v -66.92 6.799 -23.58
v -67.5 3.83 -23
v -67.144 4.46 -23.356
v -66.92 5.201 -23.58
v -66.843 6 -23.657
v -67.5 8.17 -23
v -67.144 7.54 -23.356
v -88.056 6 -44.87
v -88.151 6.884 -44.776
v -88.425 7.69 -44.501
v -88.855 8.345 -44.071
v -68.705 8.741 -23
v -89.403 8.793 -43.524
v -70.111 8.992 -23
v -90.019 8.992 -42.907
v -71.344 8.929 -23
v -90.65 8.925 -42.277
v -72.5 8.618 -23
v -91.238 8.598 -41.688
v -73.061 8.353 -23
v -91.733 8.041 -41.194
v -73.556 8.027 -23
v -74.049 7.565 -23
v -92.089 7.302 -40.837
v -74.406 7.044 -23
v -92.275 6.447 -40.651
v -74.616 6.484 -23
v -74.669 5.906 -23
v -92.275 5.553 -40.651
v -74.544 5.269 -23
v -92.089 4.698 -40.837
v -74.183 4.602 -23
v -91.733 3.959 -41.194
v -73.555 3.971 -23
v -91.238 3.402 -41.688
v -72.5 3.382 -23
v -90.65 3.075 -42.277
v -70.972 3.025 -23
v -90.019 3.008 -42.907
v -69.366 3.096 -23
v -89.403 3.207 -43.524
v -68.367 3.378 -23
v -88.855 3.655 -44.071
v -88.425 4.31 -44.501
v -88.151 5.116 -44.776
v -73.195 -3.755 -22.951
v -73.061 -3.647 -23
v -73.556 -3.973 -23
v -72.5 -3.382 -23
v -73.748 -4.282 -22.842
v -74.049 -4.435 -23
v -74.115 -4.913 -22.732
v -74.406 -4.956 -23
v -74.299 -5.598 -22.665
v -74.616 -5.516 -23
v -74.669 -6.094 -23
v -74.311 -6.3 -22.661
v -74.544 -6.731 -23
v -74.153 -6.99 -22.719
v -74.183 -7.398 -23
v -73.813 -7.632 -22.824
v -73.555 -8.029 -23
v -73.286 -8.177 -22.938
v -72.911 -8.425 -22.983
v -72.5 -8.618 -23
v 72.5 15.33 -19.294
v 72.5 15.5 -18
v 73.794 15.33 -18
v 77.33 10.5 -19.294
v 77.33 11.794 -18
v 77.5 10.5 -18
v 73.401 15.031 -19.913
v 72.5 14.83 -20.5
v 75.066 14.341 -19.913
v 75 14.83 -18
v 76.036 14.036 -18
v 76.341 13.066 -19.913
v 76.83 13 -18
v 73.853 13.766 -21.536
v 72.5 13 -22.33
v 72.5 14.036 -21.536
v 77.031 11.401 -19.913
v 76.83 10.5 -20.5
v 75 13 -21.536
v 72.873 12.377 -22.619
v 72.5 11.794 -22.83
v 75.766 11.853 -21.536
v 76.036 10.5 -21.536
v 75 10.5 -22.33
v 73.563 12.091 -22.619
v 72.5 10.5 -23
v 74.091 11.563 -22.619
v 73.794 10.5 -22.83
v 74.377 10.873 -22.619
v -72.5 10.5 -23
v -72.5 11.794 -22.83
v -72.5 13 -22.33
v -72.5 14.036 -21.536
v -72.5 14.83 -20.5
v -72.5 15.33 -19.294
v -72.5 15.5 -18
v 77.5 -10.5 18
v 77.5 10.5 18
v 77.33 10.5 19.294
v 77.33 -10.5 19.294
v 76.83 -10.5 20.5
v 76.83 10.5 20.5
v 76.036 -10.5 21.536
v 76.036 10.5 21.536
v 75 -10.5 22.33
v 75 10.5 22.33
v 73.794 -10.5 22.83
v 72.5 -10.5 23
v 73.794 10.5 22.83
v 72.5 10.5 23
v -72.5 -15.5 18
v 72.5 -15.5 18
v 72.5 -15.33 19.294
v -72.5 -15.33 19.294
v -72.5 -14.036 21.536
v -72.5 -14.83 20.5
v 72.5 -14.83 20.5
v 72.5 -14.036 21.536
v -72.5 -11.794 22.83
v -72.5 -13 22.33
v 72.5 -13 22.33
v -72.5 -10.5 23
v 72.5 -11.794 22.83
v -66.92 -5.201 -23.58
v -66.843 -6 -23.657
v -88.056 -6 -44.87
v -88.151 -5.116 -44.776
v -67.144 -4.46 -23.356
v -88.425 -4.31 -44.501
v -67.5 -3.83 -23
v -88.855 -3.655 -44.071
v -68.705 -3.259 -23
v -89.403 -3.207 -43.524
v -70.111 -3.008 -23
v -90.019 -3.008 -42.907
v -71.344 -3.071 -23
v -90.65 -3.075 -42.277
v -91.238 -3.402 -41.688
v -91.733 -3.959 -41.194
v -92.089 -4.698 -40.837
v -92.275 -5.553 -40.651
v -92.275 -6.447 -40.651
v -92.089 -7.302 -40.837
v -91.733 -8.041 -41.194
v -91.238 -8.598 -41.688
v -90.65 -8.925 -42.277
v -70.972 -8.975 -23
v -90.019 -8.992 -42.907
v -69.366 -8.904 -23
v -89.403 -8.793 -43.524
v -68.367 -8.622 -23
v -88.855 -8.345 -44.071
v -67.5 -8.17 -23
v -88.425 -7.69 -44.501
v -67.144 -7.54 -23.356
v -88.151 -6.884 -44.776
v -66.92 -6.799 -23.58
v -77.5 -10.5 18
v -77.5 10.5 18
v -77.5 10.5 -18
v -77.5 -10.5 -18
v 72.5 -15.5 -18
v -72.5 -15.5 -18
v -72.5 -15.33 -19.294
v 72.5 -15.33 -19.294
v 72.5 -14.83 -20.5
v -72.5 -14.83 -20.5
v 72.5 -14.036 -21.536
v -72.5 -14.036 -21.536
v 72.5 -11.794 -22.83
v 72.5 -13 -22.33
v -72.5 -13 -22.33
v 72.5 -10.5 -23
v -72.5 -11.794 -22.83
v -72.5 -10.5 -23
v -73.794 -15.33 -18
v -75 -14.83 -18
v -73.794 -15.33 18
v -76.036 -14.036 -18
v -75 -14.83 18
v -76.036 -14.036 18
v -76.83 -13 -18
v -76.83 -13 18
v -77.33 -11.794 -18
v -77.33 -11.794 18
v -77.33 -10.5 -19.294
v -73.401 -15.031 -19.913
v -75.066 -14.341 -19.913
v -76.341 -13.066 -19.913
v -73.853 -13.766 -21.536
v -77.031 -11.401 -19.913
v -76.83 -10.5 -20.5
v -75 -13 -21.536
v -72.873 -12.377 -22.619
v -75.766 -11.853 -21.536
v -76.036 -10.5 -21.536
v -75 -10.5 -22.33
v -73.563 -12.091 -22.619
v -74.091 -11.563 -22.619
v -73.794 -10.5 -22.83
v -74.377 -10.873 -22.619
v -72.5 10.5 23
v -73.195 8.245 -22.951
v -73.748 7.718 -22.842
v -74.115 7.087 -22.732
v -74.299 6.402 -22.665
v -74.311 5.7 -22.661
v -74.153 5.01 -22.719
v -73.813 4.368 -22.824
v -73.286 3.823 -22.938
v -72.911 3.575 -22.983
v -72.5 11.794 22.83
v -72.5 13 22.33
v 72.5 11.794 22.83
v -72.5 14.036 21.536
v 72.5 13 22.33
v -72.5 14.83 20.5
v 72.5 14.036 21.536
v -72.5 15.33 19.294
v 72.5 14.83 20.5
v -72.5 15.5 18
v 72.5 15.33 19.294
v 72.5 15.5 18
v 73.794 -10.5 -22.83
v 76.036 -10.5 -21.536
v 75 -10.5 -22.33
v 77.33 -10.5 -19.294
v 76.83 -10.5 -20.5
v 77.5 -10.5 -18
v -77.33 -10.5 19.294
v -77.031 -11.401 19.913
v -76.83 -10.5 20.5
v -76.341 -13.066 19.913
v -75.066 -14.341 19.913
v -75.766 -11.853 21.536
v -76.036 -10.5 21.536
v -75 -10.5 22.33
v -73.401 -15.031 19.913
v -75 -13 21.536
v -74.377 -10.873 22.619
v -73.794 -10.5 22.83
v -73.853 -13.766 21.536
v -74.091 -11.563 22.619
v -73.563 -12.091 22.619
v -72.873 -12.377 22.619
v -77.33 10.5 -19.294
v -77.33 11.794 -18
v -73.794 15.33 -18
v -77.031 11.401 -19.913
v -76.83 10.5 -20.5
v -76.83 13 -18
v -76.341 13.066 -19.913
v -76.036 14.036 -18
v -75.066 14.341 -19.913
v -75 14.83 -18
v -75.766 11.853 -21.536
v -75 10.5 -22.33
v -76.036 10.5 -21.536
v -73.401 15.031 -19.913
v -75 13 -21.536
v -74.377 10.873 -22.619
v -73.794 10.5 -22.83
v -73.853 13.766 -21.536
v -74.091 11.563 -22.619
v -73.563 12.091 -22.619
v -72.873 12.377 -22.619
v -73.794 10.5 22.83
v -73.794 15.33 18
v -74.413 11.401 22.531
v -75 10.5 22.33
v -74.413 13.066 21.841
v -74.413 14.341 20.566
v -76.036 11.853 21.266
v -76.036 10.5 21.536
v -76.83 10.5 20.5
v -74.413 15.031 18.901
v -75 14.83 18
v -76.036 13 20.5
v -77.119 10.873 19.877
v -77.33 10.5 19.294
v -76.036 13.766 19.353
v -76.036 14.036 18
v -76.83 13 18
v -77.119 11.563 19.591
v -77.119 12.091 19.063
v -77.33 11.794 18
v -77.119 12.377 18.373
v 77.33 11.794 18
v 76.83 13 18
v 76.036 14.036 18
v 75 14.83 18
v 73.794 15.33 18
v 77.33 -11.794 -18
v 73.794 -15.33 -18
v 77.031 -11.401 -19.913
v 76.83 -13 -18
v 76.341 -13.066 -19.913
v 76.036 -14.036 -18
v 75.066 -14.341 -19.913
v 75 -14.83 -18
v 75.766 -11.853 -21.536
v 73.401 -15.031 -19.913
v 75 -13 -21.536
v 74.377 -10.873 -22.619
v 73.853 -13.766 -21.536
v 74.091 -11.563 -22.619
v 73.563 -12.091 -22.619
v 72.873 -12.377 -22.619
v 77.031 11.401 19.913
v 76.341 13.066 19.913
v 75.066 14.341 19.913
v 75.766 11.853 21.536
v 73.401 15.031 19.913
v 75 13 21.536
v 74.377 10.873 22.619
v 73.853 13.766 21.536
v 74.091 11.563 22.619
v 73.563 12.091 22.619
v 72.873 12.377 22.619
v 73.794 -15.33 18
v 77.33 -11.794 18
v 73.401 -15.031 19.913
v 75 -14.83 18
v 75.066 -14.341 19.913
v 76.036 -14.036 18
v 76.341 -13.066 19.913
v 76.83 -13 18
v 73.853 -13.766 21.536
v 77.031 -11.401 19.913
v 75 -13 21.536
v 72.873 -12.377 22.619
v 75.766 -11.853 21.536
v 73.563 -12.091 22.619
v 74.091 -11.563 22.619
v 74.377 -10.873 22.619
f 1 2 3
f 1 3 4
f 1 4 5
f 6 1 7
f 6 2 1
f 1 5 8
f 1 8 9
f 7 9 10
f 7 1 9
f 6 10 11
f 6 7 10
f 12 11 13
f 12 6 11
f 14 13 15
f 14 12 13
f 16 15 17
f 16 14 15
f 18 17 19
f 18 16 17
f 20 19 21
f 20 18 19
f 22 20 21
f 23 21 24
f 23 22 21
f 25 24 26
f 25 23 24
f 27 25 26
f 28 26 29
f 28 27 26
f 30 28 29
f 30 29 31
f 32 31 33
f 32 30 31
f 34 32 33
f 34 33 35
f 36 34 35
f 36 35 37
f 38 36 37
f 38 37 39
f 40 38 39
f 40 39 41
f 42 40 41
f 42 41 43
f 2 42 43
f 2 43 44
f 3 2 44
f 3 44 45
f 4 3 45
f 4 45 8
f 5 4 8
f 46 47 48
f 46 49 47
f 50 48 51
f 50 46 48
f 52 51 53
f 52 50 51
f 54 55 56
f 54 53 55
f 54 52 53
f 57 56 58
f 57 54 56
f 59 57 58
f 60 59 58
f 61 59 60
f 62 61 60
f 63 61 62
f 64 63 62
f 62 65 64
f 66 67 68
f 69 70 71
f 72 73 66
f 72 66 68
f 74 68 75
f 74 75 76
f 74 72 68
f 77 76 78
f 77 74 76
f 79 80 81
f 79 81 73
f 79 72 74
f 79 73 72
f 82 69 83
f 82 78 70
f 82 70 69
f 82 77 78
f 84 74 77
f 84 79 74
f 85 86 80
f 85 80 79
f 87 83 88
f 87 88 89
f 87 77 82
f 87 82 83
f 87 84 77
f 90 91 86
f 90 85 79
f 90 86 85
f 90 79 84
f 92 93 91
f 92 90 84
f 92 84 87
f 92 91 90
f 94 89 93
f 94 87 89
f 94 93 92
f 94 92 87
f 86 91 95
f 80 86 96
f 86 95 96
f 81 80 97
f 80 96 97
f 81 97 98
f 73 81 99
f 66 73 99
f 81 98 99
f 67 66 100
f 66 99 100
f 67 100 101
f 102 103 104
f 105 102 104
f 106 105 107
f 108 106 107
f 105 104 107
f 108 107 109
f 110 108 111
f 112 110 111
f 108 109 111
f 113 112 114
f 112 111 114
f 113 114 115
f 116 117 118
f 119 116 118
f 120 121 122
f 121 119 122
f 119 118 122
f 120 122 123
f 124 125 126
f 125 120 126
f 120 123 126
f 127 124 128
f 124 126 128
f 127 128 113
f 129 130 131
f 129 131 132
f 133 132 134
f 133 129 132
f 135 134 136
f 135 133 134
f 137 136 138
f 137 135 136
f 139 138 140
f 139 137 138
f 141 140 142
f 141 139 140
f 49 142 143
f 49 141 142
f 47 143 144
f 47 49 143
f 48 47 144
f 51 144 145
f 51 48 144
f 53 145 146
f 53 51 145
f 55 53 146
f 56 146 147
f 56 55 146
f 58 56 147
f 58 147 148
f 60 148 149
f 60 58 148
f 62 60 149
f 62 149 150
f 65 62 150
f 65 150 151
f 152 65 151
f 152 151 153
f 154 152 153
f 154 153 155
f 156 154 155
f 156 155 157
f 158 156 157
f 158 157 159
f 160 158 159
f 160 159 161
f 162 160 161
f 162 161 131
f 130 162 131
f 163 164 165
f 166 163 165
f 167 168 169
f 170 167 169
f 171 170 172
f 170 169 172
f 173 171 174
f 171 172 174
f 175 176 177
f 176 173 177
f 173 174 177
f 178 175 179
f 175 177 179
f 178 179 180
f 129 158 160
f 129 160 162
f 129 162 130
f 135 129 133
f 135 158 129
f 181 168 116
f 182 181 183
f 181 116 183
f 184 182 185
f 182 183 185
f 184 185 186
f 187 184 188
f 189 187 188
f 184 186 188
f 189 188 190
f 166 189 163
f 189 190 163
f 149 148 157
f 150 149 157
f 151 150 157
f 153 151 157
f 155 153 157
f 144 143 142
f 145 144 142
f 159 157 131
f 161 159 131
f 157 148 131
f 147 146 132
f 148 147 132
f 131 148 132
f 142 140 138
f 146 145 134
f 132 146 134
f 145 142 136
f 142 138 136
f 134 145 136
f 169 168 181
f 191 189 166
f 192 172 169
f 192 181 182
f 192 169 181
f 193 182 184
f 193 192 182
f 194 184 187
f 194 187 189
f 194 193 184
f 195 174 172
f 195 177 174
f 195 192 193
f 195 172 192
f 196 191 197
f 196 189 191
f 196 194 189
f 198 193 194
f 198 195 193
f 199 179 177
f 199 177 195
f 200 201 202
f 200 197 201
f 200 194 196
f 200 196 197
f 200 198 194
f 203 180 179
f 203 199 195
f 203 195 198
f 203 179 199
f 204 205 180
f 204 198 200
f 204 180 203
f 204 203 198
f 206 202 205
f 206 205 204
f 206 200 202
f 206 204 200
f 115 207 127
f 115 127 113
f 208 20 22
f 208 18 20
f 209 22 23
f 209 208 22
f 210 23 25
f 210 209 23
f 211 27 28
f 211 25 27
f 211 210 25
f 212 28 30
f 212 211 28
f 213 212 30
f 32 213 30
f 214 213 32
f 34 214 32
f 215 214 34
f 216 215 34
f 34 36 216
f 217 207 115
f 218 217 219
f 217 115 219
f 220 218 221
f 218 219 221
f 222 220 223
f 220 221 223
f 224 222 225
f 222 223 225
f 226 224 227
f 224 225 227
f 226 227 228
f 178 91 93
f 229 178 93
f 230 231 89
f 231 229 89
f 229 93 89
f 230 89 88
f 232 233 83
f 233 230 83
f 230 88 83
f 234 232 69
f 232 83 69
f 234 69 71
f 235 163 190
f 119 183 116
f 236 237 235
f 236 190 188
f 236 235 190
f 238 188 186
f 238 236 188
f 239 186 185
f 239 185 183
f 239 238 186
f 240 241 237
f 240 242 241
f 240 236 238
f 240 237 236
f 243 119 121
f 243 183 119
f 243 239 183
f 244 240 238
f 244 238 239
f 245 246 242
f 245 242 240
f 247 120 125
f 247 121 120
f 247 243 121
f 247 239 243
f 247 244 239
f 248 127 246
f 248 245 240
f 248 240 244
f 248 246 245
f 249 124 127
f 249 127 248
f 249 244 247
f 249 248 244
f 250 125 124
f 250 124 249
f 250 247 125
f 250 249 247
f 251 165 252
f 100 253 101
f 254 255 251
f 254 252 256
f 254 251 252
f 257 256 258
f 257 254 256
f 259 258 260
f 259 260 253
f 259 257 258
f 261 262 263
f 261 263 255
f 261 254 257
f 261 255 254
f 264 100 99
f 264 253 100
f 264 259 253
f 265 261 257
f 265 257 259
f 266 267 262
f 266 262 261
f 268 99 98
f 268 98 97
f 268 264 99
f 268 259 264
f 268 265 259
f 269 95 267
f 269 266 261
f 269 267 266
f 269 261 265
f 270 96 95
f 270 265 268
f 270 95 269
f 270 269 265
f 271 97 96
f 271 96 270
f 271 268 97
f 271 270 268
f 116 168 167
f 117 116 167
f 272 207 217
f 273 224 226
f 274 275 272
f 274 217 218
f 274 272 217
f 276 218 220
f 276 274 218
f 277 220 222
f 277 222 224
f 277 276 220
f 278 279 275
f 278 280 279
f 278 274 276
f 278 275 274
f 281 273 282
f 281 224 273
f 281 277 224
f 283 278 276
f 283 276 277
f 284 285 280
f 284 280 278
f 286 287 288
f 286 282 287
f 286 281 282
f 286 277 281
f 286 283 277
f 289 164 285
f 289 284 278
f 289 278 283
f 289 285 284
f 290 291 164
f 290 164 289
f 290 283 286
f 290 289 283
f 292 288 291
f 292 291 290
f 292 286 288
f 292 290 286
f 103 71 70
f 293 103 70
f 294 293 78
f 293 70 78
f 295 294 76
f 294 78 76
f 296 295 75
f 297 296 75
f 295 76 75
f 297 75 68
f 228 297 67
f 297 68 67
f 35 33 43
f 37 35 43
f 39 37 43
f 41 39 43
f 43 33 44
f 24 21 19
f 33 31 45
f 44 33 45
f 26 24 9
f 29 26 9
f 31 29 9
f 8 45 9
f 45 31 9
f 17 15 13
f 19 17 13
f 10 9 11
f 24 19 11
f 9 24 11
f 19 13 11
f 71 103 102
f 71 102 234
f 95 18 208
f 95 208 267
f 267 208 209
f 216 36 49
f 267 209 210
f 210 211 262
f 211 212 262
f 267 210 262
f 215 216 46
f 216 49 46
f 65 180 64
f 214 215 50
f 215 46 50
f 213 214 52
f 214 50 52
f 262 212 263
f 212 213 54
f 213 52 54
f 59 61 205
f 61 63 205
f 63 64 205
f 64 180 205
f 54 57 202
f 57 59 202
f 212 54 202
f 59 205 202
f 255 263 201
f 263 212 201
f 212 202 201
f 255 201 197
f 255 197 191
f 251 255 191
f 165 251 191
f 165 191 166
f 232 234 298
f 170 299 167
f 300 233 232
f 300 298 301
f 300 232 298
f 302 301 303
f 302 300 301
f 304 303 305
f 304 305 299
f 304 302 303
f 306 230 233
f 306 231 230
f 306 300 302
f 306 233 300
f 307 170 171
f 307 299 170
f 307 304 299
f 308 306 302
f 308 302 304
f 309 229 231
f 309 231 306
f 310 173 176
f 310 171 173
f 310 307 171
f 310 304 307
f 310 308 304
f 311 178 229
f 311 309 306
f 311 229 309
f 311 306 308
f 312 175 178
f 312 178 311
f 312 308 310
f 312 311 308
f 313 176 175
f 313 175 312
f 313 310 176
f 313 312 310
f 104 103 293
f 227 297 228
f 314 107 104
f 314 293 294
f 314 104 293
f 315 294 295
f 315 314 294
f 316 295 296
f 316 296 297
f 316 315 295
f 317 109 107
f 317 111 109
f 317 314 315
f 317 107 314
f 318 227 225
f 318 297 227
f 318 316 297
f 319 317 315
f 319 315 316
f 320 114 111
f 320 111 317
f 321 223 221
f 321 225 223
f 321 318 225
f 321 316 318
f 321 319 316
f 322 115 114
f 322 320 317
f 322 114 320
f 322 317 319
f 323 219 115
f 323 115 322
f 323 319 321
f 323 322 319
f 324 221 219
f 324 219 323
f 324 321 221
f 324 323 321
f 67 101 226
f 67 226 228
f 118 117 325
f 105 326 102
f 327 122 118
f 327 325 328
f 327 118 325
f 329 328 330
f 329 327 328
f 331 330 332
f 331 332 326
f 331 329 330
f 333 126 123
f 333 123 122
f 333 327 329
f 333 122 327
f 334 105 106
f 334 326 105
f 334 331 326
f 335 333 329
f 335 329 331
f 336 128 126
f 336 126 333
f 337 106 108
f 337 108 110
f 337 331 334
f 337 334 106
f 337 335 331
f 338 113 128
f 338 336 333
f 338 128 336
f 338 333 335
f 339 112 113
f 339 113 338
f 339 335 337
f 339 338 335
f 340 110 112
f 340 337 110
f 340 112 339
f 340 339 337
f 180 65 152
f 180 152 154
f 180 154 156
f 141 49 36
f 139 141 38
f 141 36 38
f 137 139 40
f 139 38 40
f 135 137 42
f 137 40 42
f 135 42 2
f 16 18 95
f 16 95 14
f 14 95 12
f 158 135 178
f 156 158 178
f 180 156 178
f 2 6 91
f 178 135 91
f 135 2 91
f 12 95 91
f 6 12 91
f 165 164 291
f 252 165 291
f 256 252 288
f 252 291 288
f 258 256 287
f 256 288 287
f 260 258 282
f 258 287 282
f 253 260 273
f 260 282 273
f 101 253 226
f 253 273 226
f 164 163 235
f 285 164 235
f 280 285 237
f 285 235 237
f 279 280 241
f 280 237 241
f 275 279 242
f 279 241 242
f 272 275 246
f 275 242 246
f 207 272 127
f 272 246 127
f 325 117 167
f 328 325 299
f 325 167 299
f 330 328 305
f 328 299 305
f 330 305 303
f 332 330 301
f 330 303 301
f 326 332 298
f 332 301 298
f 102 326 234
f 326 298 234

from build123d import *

# Parameters (mm, degrees)
SKETCH1_W           = 155
SKETCH1_H           = 46
BOSS_EXTRUDE1_DEPTH = 15.5
SKETCH4_R           = 3
BOSS_EXTRUDE2_DEPTH = 30
FILLET1_R           = 5


with BuildPart() as part:
    # Sketch1 → Boss-Extrude1 (new, symmetric)
    with BuildSketch(Plane(origin=(0, 0, 0), x_dir=(1, 0, 0), z_dir=(0, 1, 0))):
        Rectangle(SKETCH1_W, SKETCH1_H)
    extrude(amount=BOSS_EXTRUDE1_DEPTH, both=True)

    # Sketch4 → Boss-Extrude2 (add)
    with BuildSketch(Plane(origin=(-45.25, 0, -45.25), x_dir=(0.7071067811865509, 0, -0.7071067811865442), z_dir=(0.7071067811865442, 0, 0.7071067811865509))):
        with Locations((-33.537319575, 6)):
            Circle(SKETCH4_R)
        with Locations((-33.537319575, -6)):
            Circle(SKETCH4_R)
    extrude(amount=-BOSS_EXTRUDE2_DEPTH)

    # Fillet1
    # the kernel refuses this fillet: 5 mm, written as the material it takes off along each edge
    with BuildSketch(Plane(origin=(-72.5, 10.5, 18), x_dir=(0, 1, 0), z_dir=(-1, 0, 0))) as fillet1_piece_1_section:
        Polygon((0, 0), (FILLET1_R, 0), (FILLET1_R, -FILLET1_R), (0, -FILLET1_R), align=None)
    fillet1_piece_1 = extrude(amount=FILLET1_R, mode=Mode.PRIVATE)
    fillet1_piece_1 = fillet1_piece_1 - Plane(origin=(-72.5, 10.5, 18), x_dir=(0, -0.7071067811865475, -0.7071067811865475), z_dir=(-1, 0, 0)) * Sphere(FILLET1_R, mode=Mode.PRIVATE)
    add(fillet1_piece_1, mode=Mode.SUBTRACT)
    with BuildSketch(Plane(origin=(-72.5, 10.5, -18), x_dir=(-1, 0, 0), z_dir=(0, 0, -1))) as fillet1_piece_2_section:
        Polygon((0, 0), (FILLET1_R, 0), (FILLET1_R, FILLET1_R), (0, FILLET1_R), align=None)
    fillet1_piece_2 = extrude(amount=FILLET1_R, mode=Mode.PRIVATE)
    fillet1_piece_2 = fillet1_piece_2 - Plane(origin=(-72.5, 10.5, -18), x_dir=(0.7071067811865475, -0.7071067811865475, 0), z_dir=(0, 0, -1)) * Sphere(FILLET1_R, mode=Mode.PRIVATE)
    add(fillet1_piece_2, mode=Mode.SUBTRACT)
    with BuildSketch(Plane(origin=(72.5, 10.5, 18), x_dir=(0, 1, 0), z_dir=(0, 0, 1))) as fillet1_piece_3_section:
        Polygon((0, 0), (FILLET1_R, 0), (FILLET1_R, -FILLET1_R), (0, -FILLET1_R), align=None)
    fillet1_piece_3 = extrude(amount=FILLET1_R, mode=Mode.PRIVATE)
    fillet1_piece_3 = fillet1_piece_3 - Plane(origin=(72.5, 10.5, 18), x_dir=(-0.7071067811865475, -0.7071067811865475, 0), z_dir=(0, 0, 1)) * Sphere(FILLET1_R, mode=Mode.PRIVATE)
    add(fillet1_piece_3, mode=Mode.SUBTRACT)
    with BuildSketch(Plane(origin=(72.5, 10.5, -18), x_dir=(0, 1, 0), z_dir=(0, 0, -1))) as fillet1_piece_4_section:
        Polygon((0, 0), (FILLET1_R, 0), (FILLET1_R, FILLET1_R), (0, FILLET1_R), align=None)
    fillet1_piece_4 = extrude(amount=FILLET1_R, mode=Mode.PRIVATE)
    fillet1_piece_4 = fillet1_piece_4 - Plane(origin=(72.5, 10.5, -18), x_dir=(-0.7071067811865475, -0.7071067811865475, 0), z_dir=(0, 0, -1)) * Sphere(FILLET1_R, mode=Mode.PRIVATE)
    add(fillet1_piece_4, mode=Mode.SUBTRACT)
    with BuildSketch(Plane(origin=(72.5, -10.5, 18), x_dir=(0, -1, 0), z_dir=(0, 0, 1))) as fillet1_piece_5_section:
        Polygon((0, 0), (FILLET1_R, 0), (FILLET1_R, FILLET1_R), (0, FILLET1_R), align=None)
    fillet1_piece_5 = extrude(amount=FILLET1_R, mode=Mode.PRIVATE)
    fillet1_piece_5 = fillet1_piece_5 - Plane(origin=(72.5, -10.5, 18), x_dir=(-0.7071067811865475, 0.7071067811865475, 0), z_dir=(0, 0, 1)) * Sphere(FILLET1_R, mode=Mode.PRIVATE)
    add(fillet1_piece_5, mode=Mode.SUBTRACT)
    with BuildSketch(Plane(origin=(-72.5, -10.5, 18), x_dir=(0, -1, 0), z_dir=(0, 0, 1))) as fillet1_piece_6_section:
        Polygon((0, 0), (FILLET1_R, 0), (FILLET1_R, -FILLET1_R), (0, -FILLET1_R), align=None)
    fillet1_piece_6 = extrude(amount=FILLET1_R, mode=Mode.PRIVATE)
    fillet1_piece_6 = fillet1_piece_6 - Plane(origin=(-72.5, -10.5, 18), x_dir=(0.7071067811865475, 0.7071067811865475, 0), z_dir=(0, 0, 1)) * Sphere(FILLET1_R, mode=Mode.PRIVATE)
    add(fillet1_piece_6, mode=Mode.SUBTRACT)
    with BuildSketch(Plane(origin=(-72.5, -10.5, -18), x_dir=(-1, 0, 0), z_dir=(0, 0, -1))) as fillet1_piece_7_section:
        Polygon((0, 0), (FILLET1_R, 0), (FILLET1_R, -FILLET1_R), (0, -FILLET1_R), align=None)
    fillet1_piece_7 = extrude(amount=FILLET1_R, mode=Mode.PRIVATE)
    fillet1_piece_7 = fillet1_piece_7 - Plane(origin=(-72.5, -10.5, -18), x_dir=(0.7071067811865475, 0.7071067811865475, 0), z_dir=(0, 0, -1)) * Sphere(FILLET1_R, mode=Mode.PRIVATE)
    add(fillet1_piece_7, mode=Mode.SUBTRACT)
    with BuildSketch(Plane(origin=(72.5, -10.5, -18), x_dir=(0, -1, 0), z_dir=(0, 0, -1))) as fillet1_piece_8_section:
        Polygon((0, 0), (FILLET1_R, 0), (FILLET1_R, -FILLET1_R), (0, -FILLET1_R), align=None)
    fillet1_piece_8 = extrude(amount=FILLET1_R, mode=Mode.PRIVATE)
    fillet1_piece_8 = fillet1_piece_8 - Plane(origin=(72.5, -10.5, -18), x_dir=(-0.7071067811865475, 0.7071067811865475, 0), z_dir=(0, 0, -1)) * Sphere(FILLET1_R, mode=Mode.PRIVATE)
    add(fillet1_piece_8, mode=Mode.SUBTRACT)
    with BuildSketch(Plane(origin=(-77.5, 15.5, 18), x_dir=(0, -1, 0), z_dir=(0, 0, -1)), Plane(origin=(77.5, -15.5, -18), x_dir=(-1, 0, 0), z_dir=(0, 0, 1))) as fillet1_piece_9:
        with BuildLine():
            CenterArc((FILLET1_R, -FILLET1_R), FILLET1_R, 90, 90)
            Line((0, -FILLET1_R), (0, 0))
            Line((0, 0), (FILLET1_R, 0))
        make_face()
    extrude(amount=36, mode=Mode.SUBTRACT)
    with BuildSketch(Plane(origin=(72.5, 15.5, 23), x_dir=(0, 0, -1), z_dir=(-1, 0, 0)), Plane(origin=(-72.5, -15.5, -23), x_dir=(0, 1, 0), z_dir=(1, 0, 0))) as fillet1_piece_10:
        with BuildLine():
            CenterArc((FILLET1_R, FILLET1_R), FILLET1_R, 180, 90)
            Line((0, FILLET1_R), (0, 0))
            Line((0, 0), (FILLET1_R, 0))
        make_face()
    extrude(amount=145, mode=Mode.SUBTRACT)
    with BuildSketch(Plane(origin=(77.5, 15.5, -18), x_dir=(-1, 0, 0), z_dir=(0, 0, 1)), Plane(origin=(-77.5, -15.5, 18), x_dir=(0, 1, 0), z_dir=(0, 0, -1))) as fillet1_piece_11:
        with BuildLine():
            CenterArc((FILLET1_R, FILLET1_R), FILLET1_R, 180, 90)
            Line((0, FILLET1_R), (0, 0))
            Line((0, 0), (FILLET1_R, 0))
        make_face()
    extrude(amount=36, mode=Mode.SUBTRACT)
    with BuildSketch(Plane(origin=(72.5, -15.5, 23), x_dir=(0, 0, -1), z_dir=(-1, 0, 0)), Plane(origin=(-72.5, 15.5, -23), x_dir=(0, -1, 0), z_dir=(1, 0, 0))) as fillet1_piece_12:
        with BuildLine():
            CenterArc((FILLET1_R, -FILLET1_R), FILLET1_R, 90, 90)
            Line((0, -FILLET1_R), (0, 0))
            Line((0, 0), (FILLET1_R, 0))
        make_face()
    extrude(amount=145, mode=Mode.SUBTRACT)
    with BuildSketch(Plane(origin=(77.5, 10.5, 23), x_dir=(0, 0, -1), z_dir=(0, -1, 0)), Plane(origin=(-77.5, -10.5, 23), x_dir=(0, 0, -1), z_dir=(0, 1, 0)), Plane(origin=(77.5, 10.5, -23), x_dir=(-1, 0, 0), z_dir=(0, -1, 0))) as fillet1_piece_13:
        with BuildLine():
            CenterArc((FILLET1_R, -FILLET1_R), FILLET1_R, 90, 90)
            Line((0, -FILLET1_R), (0, 0))
            Line((0, 0), (FILLET1_R, 0))
        make_face()
    extrude(amount=21, mode=Mode.SUBTRACT)
    with BuildSketch(Plane(origin=(-77.5, -10.5, -23), x_dir=(1, 0, 0), z_dir=(0, 1, 0))) as fillet1_piece_14_section:
        with BuildLine():
            CenterArc((FILLET1_R, -FILLET1_R), FILLET1_R, 90, 90)
            Line((0, -FILLET1_R), (0, 0))
            Line((0, 0), (FILLET1_R, 0))
        make_face()
    fillet1_piece_14 = extrude(amount=21, mode=Mode.PRIVATE)
    fillet1_piece_14 = fillet1_piece_14 - Plane(origin=(-72.851968895, -6, -25.423036706), x_dir=(0.7071067811865509, 0, -0.7071067811865442), z_dir=(0.7071067811865442, 0, 0.7071067811865509)) * Cylinder(3, 62, mode=Mode.PRIVATE)
    fillet1_piece_14 = fillet1_piece_14 - Plane(origin=(-72.851968895, 6, -25.423036706), x_dir=(0.7071067811865509, 0, -0.7071067811865442), z_dir=(0.7071067811865442, 0, 0.7071067811865509)) * Cylinder(3, 62, mode=Mode.PRIVATE)
    add(fillet1_piece_14, mode=Mode.SUBTRACT)


solid = part.part
